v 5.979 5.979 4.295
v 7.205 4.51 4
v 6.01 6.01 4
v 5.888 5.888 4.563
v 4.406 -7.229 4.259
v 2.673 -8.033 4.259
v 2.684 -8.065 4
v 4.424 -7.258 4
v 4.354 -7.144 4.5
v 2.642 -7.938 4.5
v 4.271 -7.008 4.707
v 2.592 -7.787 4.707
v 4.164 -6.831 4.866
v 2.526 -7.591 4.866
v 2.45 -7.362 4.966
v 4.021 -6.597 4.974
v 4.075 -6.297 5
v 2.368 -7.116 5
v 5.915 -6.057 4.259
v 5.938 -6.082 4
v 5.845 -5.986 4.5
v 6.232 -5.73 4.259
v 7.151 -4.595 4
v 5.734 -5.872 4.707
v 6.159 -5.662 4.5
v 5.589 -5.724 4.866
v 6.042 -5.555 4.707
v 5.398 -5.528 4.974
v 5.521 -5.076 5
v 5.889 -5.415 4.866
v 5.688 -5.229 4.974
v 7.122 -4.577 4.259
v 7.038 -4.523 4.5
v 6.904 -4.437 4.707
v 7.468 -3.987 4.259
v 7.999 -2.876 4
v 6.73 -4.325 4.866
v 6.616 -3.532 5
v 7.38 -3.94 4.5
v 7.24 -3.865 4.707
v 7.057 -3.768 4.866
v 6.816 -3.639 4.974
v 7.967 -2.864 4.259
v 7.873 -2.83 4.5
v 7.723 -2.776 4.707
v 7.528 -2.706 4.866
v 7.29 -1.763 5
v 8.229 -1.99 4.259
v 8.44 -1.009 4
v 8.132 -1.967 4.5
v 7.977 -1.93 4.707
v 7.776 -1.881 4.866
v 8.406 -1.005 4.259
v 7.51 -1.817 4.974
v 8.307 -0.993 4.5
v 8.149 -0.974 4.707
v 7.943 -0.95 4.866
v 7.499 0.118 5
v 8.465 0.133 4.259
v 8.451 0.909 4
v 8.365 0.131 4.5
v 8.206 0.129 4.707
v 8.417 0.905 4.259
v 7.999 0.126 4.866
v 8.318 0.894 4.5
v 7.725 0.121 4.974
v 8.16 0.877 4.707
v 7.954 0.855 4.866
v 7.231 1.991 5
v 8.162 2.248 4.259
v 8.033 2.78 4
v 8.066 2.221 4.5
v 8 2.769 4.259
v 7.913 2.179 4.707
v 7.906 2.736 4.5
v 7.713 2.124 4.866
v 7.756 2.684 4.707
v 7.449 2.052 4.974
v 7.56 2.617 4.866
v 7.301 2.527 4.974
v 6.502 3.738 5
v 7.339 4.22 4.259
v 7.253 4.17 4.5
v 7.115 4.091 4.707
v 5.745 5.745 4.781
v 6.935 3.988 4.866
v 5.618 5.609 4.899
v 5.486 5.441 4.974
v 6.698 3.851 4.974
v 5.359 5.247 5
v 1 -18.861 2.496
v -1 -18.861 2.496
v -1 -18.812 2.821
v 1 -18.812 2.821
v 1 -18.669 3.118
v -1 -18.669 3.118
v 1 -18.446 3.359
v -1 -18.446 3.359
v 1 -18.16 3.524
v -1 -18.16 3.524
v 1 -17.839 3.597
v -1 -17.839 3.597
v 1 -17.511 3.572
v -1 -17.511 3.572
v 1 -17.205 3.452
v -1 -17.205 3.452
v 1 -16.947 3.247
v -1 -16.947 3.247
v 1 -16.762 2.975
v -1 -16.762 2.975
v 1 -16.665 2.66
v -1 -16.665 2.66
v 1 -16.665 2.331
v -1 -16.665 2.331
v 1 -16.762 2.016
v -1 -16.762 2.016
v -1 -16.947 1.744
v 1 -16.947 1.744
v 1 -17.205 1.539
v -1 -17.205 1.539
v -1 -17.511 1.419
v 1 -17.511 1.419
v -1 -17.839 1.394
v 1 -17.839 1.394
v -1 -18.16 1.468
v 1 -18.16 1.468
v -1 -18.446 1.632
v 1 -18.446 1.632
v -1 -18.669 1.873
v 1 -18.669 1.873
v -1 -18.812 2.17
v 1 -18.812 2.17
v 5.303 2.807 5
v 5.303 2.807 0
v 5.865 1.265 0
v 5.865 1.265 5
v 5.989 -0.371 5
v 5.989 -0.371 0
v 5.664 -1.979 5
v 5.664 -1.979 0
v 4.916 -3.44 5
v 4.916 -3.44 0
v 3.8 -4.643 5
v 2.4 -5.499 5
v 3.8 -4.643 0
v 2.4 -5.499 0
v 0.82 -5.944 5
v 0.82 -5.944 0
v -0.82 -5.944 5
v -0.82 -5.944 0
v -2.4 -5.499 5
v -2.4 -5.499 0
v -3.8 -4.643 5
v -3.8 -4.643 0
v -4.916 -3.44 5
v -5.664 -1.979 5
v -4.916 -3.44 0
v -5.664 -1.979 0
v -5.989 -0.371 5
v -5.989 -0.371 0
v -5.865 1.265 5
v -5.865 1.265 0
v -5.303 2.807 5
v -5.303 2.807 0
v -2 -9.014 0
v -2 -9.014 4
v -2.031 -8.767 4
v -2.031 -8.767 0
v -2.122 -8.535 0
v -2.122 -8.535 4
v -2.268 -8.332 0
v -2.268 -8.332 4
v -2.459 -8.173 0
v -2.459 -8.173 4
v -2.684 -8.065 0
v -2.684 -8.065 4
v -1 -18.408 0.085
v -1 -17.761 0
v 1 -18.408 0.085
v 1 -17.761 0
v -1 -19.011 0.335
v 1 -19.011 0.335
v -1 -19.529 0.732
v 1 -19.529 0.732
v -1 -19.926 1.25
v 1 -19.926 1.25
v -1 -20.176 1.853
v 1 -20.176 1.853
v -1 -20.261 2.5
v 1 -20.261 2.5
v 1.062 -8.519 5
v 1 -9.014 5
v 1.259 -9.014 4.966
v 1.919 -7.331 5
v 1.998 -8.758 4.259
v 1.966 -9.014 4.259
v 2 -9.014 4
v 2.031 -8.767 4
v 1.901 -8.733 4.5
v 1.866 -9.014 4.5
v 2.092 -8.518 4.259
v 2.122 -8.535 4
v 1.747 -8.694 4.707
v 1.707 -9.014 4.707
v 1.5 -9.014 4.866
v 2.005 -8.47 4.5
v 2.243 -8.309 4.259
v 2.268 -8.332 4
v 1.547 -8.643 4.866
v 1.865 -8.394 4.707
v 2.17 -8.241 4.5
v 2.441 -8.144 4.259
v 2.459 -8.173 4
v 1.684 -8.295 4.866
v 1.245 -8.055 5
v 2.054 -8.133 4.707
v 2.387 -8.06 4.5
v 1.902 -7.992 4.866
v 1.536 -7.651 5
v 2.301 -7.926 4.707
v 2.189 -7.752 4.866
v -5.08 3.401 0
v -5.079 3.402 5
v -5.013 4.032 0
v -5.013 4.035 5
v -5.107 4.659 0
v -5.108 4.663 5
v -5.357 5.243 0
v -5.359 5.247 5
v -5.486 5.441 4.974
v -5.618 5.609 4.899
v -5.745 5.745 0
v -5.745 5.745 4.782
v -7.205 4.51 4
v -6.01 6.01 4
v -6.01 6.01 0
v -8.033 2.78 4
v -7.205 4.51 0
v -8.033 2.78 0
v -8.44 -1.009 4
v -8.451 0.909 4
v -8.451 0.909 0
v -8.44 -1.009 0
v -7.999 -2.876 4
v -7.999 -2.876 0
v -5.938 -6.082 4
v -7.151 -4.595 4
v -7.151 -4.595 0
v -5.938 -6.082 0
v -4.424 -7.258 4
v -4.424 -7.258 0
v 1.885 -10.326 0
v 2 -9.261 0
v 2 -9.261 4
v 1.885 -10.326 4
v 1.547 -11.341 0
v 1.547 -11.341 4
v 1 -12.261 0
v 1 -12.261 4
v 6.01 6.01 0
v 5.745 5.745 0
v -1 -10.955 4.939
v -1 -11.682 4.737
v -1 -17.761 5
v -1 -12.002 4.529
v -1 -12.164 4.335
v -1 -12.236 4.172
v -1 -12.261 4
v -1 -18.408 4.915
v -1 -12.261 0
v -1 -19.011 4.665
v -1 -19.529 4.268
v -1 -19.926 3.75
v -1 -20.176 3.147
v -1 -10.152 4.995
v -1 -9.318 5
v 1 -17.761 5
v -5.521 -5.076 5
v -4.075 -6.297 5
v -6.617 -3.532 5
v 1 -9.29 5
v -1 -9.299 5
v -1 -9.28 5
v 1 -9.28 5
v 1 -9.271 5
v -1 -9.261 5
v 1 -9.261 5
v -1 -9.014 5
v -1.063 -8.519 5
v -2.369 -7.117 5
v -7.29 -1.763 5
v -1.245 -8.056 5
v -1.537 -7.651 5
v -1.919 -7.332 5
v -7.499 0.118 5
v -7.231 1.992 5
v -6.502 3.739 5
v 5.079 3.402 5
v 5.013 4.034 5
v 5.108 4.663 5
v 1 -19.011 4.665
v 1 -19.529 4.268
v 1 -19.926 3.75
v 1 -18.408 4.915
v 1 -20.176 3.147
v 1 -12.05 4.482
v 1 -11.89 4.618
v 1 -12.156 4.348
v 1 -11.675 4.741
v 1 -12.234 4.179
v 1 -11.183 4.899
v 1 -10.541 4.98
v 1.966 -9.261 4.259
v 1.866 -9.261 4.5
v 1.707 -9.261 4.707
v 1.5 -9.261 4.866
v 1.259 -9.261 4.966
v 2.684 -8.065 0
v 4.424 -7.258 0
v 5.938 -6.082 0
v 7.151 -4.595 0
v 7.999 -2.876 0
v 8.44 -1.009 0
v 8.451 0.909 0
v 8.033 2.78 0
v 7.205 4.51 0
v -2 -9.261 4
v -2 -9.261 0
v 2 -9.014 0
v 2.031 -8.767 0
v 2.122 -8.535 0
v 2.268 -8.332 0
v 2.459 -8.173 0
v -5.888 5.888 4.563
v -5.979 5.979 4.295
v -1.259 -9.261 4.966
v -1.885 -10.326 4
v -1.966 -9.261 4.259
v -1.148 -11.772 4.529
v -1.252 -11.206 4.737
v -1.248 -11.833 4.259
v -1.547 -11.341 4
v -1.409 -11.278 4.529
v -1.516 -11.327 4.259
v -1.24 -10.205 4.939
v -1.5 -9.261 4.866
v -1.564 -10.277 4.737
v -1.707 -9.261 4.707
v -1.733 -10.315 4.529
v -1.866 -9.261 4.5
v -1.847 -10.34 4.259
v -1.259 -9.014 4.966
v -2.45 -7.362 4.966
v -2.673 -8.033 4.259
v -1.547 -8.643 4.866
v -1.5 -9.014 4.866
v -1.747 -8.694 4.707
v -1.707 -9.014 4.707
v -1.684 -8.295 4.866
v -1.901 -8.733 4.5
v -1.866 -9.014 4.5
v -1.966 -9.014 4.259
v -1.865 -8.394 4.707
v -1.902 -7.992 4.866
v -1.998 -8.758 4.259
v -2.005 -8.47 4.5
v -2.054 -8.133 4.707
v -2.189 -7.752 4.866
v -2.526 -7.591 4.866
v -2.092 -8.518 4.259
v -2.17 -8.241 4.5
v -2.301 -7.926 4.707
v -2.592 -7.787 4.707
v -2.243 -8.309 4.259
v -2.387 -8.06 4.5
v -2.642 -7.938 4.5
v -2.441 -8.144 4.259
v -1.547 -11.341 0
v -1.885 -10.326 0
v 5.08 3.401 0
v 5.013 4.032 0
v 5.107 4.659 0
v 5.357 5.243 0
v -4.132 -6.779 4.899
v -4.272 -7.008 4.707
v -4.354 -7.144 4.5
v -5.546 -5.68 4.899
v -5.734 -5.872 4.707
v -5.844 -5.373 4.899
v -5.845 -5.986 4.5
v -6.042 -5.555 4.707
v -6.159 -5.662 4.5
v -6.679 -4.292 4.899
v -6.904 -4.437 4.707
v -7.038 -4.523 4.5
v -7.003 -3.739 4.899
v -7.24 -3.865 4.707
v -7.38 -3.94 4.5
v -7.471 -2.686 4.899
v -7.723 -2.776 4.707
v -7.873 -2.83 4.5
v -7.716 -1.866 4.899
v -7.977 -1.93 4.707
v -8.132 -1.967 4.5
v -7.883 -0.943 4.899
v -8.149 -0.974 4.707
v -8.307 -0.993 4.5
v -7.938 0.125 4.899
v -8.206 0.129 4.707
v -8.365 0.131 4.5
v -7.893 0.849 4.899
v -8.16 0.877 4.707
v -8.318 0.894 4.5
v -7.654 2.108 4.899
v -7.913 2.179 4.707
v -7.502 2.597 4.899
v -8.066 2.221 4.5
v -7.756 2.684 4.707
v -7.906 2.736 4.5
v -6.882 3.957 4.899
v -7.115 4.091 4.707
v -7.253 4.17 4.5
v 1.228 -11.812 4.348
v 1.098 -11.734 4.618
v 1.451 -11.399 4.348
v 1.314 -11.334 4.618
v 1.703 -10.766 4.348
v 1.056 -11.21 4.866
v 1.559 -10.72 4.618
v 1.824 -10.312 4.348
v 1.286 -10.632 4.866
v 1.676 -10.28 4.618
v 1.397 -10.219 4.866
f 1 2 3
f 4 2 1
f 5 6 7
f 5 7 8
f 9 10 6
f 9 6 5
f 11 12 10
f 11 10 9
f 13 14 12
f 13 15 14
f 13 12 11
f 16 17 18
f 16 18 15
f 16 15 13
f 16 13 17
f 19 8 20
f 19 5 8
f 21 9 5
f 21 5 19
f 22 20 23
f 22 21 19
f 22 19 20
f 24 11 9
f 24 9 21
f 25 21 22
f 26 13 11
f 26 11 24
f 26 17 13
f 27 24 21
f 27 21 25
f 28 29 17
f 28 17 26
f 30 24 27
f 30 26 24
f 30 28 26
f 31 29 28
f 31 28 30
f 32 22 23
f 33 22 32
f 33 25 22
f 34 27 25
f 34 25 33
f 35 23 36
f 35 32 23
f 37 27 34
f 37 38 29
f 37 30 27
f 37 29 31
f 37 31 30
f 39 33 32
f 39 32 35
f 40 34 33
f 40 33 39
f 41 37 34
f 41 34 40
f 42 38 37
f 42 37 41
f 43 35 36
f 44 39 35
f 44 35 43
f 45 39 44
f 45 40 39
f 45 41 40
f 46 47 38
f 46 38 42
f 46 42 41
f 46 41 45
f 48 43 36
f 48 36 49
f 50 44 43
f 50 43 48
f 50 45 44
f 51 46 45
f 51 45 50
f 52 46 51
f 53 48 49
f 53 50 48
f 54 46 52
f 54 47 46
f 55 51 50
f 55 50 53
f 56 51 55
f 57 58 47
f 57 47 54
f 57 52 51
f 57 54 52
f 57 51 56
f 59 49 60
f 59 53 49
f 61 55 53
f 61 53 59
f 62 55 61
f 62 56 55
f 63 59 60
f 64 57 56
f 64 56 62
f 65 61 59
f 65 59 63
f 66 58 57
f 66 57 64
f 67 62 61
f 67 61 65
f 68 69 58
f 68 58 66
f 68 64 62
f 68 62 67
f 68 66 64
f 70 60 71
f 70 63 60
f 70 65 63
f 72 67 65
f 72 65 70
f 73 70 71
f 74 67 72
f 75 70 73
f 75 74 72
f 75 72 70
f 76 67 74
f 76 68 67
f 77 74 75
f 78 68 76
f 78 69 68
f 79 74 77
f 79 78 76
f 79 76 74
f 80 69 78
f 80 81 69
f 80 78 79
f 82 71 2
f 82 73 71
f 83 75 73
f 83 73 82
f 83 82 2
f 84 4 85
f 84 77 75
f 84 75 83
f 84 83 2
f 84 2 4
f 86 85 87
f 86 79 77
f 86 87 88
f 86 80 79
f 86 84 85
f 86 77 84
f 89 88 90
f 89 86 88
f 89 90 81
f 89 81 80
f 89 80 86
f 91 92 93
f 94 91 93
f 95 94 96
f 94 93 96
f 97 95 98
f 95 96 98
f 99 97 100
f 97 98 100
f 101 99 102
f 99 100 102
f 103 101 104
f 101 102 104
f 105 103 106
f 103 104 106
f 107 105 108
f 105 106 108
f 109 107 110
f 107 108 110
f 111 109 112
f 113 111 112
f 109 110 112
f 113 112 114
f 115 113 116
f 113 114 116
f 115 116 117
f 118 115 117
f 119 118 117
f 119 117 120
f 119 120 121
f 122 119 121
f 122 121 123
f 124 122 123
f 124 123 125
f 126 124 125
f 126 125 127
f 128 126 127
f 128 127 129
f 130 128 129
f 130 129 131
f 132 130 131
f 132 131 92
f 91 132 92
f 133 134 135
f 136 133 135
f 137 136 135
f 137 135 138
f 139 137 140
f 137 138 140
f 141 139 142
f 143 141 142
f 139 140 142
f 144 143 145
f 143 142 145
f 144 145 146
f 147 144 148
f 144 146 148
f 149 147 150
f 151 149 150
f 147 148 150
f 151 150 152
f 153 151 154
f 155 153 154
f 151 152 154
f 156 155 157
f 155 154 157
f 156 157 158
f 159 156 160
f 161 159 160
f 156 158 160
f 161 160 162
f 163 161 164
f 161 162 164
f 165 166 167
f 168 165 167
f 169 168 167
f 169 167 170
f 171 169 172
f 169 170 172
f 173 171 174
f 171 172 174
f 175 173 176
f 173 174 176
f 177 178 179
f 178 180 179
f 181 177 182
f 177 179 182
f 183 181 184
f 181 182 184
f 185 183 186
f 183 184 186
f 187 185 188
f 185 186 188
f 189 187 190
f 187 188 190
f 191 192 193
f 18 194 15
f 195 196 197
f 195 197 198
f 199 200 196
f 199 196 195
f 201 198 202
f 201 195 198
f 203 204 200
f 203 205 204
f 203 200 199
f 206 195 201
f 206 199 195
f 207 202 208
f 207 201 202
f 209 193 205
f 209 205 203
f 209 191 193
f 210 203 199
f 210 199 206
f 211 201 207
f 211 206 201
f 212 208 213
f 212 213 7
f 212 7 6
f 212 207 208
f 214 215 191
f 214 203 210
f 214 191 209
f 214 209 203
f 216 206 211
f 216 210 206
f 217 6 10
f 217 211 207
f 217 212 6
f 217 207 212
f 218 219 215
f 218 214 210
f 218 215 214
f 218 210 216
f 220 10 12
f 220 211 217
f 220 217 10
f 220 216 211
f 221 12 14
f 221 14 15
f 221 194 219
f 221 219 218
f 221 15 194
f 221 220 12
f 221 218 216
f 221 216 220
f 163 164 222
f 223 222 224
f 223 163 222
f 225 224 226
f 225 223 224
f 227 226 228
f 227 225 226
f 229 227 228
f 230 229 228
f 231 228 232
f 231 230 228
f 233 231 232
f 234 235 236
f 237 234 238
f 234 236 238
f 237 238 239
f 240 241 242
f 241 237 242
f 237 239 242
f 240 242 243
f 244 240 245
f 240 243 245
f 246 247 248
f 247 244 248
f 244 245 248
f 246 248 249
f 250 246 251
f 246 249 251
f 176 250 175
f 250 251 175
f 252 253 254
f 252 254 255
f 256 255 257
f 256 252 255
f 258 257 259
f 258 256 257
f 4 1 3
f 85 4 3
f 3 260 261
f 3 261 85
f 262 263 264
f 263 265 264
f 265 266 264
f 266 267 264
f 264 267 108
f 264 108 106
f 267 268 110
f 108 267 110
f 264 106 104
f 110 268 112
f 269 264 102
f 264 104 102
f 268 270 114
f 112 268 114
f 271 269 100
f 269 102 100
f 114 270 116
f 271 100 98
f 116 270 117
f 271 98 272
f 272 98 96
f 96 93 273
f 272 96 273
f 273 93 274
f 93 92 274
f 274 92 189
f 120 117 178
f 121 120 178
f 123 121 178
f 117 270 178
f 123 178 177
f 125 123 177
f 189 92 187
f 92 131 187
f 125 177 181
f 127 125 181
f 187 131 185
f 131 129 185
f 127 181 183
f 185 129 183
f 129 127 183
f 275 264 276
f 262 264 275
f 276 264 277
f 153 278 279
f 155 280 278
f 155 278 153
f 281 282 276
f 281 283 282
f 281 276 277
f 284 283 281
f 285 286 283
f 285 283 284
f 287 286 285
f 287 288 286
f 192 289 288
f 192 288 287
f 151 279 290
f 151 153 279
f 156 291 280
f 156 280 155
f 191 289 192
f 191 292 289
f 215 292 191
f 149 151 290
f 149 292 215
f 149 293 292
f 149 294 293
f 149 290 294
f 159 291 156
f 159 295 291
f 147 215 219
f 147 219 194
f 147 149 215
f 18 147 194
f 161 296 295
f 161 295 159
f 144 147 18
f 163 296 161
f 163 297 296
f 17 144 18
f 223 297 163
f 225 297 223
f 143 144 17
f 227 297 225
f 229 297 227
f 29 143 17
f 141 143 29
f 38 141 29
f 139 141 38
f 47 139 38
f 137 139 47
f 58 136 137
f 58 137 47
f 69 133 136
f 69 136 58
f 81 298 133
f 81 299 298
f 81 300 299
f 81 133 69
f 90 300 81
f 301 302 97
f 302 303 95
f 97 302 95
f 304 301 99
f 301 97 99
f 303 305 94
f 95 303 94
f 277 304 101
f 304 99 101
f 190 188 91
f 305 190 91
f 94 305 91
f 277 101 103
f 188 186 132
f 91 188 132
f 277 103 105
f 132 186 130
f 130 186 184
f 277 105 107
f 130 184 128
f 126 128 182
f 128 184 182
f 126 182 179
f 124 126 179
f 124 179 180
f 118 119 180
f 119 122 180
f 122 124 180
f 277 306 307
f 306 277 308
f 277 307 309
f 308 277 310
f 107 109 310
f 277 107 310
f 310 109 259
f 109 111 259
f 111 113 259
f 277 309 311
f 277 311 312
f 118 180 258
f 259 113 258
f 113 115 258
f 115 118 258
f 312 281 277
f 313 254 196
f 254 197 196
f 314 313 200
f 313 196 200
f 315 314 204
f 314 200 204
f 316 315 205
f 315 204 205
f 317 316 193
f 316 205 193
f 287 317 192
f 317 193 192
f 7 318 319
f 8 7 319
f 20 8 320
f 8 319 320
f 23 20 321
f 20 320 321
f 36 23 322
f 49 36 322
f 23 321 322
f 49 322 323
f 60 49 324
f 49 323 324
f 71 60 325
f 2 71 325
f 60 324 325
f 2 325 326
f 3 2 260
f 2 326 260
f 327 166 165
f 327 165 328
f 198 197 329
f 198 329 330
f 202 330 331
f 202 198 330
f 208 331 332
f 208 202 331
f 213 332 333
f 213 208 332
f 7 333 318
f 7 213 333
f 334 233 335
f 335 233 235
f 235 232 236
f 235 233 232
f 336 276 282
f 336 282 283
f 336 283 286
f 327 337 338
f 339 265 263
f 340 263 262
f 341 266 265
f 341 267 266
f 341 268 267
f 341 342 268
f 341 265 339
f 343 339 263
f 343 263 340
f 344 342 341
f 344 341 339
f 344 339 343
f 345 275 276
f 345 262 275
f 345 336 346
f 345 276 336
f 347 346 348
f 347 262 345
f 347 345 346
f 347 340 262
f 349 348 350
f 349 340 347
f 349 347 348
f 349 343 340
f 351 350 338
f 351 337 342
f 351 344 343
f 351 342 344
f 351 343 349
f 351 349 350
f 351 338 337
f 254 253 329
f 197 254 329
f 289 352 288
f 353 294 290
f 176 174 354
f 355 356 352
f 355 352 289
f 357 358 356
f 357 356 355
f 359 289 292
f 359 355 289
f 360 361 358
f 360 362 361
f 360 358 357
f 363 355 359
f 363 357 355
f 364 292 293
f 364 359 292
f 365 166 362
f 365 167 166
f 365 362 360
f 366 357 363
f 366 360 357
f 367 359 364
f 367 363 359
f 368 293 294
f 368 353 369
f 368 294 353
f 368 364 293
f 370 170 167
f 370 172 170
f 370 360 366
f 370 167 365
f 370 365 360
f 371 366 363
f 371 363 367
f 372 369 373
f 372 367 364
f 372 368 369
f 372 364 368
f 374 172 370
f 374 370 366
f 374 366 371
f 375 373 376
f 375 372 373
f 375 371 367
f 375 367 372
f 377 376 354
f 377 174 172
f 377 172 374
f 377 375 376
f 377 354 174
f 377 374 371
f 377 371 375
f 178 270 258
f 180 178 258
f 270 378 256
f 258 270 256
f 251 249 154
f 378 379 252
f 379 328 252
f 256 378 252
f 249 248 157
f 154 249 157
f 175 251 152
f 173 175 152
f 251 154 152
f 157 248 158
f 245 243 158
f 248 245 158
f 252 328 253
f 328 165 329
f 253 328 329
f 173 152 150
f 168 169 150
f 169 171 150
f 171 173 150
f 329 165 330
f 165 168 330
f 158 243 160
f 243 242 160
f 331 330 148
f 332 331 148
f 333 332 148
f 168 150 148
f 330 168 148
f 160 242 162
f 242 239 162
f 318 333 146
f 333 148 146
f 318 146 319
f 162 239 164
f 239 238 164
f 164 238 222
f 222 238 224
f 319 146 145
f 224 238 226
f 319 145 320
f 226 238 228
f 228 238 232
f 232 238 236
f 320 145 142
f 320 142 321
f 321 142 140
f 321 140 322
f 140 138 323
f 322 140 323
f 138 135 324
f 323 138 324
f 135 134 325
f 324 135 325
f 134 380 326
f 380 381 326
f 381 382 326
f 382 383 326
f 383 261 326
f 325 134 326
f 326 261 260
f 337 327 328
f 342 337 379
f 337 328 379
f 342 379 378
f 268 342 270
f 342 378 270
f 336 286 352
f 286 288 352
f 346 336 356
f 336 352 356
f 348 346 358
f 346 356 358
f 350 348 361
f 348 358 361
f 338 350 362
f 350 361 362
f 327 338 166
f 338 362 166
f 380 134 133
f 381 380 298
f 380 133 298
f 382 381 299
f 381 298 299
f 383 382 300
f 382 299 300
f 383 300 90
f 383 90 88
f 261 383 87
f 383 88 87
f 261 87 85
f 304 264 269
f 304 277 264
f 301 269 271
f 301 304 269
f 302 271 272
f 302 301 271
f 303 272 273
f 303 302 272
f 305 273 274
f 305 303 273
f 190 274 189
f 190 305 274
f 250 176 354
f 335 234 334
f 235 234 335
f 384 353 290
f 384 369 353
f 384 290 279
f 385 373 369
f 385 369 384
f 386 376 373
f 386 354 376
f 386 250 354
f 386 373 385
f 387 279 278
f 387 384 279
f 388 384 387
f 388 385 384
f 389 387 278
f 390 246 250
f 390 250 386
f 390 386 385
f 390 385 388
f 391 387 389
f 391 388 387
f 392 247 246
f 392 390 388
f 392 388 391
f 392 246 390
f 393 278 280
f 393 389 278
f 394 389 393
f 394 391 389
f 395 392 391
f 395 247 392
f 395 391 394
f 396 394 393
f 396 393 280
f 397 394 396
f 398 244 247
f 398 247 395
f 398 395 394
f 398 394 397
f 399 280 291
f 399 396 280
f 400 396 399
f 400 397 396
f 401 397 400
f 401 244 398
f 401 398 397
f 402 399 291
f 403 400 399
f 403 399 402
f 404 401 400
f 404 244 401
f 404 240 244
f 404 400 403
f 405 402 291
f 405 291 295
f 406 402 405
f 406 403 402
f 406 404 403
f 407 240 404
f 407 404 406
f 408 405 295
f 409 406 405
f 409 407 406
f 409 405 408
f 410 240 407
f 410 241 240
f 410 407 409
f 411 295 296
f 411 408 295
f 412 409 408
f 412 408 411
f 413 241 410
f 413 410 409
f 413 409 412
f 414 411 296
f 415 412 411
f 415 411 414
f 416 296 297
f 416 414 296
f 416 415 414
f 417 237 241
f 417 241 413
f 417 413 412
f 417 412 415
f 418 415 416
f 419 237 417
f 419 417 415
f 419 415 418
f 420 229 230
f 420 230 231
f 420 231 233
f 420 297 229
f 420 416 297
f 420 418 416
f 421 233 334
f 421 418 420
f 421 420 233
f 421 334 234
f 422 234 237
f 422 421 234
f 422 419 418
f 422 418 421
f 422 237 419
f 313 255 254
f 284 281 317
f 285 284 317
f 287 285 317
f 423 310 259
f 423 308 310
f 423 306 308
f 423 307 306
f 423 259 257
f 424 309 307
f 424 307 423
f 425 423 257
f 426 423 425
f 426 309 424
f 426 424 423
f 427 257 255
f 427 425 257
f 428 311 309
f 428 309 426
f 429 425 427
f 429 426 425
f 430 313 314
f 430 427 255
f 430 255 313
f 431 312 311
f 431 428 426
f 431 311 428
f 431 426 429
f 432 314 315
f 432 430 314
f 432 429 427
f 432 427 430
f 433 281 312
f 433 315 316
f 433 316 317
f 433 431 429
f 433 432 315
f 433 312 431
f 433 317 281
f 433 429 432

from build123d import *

# Parameters (mm, degrees)
F1_DEPTH    = 5
F2_R        = 1.1043953889
F3_DEPTH    = 5
F4_R        = 2.5
F5_T1_DEPTH = 20
F6_F1_R     = 1
F6_F2_R     = 1
F6_F3_R     = 0.9999
F6_F4_R     = 0.9996
F7_R        = 2.49999


# Not quite as in the source:
# - a fillet or chamfer that OpenCascade refuses, or shapes differently, is made with other operations: its cross-section is extruded or revolved along the edge and cut away or added
# - a fillet or chamfer is up to 0.001 mm smaller than in the source, because OpenCascade refuses the exact size


with BuildPart() as f1:
    # F0 (on Top) → F1 (new body)
    with BuildSketch(Plane.XY):
        with BuildLine():
            ThreePointArc((4.2426406871, 4.2426406871), (0, -6), (-4.2426406871, 4.2426406871))
            Line((-4.2426406871, 4.2426406871), (-6.0104076401, 6.0104076401))
            ThreePointArc((-6.0104076401, 6.0104076401), (-8.1830596791, -2.2994639132), (-2, -8.2613558209))
            Line((-2, -8.2613558209), (-2, -12.2613558209))
            Line((-2, -12.2613558209), (-1, -12.2613558209))
            Line((-1, -12.2613558209), (-1, -20.2613558209))
            Line((-1, -20.2613558209), (0, -20.2613558209))
            Line((0, -20.2613558209), (1, -20.2613558209))
            Line((1, -20.2613558209), (1, -12.2613558209))
            Line((1, -12.2613558209), (2, -12.2613558209))
            Line((2, -12.2613558209), (2, -8.2613558209))
            ThreePointArc((2, -8.2613558209), (8.1830596791, -2.2994639132), (6.0104076401, 6.0104076401))
            Line((6.0104076401, 6.0104076401), (4.2426406871, 4.2426406871))
        make_face()
    extrude(amount=F1_DEPTH)

    # F2 (on face) → F3 (cut)
    with BuildSketch(Plane(origin=(-1, 0, 0), x_dir=(0, -1, 0), z_dir=(-1, 0, 0))):
        with Locations((17.756960432, 2.4956046111)):
            Circle(F2_R)
    extrude(amount=-F3_DEPTH, mode=Mode.SUBTRACT)

    # F4
    f4_edges = [f1.edges().sort_by_distance(p)[0] for p in [
        (4.242641, 4.242641, 2.5),
        (-4.242641, 4.242641, 2.5),
    ]]
    fillet(f4_edges, radius=F4_R)

    # F5: fillet of radius 5 on 2 edges, made by hand

    # F5_s2 → F5_t1 (cut)
    with BuildSketch(Plane.XY.offset(-7.5)):
        with BuildLine():
            ThreePointArc((2, -9.2613558209), (1.7434164903, -10.842494651), (1, -12.2613558209))
            Line((1, -12.2613558209), (2, -12.2613558209))
            Line((2, -12.2613558209), (2, -9.2613558209))
        make_face()
        with BuildLine():
            ThreePointArc((-2, -9.2613558209), (-1.7434164903, -10.842494651), (-1, -12.2613558209))
            Line((-1, -12.2613558209), (-2, -12.2613558209))
            Line((-2, -12.2613558209), (-2, -9.2613558209))
        make_face()
    extrude(amount=F5_T1_DEPTH, mode=Mode.SUBTRACT)

    # F6: fillet of radius 1 on 6 edges, made by hand

    # F6_f1
    f6_f1_edges = [f1.edges().sort_by_distance(p)[0] for p in [
        (-2, -8.2613558209, 2.5),
    ]]
    fillet(f6_f1_edges, radius=F6_F1_R)

    # F6_f2
    f6_f2_edges = [f1.edges().sort_by_distance(p)[0] for p in [
        (2, -8.2613558209, 2.5),
    ]]
    fillet(f6_f2_edges, radius=F6_F2_R)

    # F6_f3 (radius 1 in the source; OpenCascade refuses exactly that, so slightly less here)
    f6_f3_edges = [f1.edges().sort_by_distance(p)[0] for p in [
        (2, -9.1376170048, 5),
        (1.7434164903, -10.842494651, 5),
    ]]
    fillet(f6_f3_edges, radius=F6_F3_R)

    # F6_f4 (radius 1 in the source; OpenCascade refuses exactly that, so slightly less here)
    f6_f4_edges = [f1.edges().sort_by_distance(p)[0] for p in [
        (-1.7434164903, -10.842494651, 5),
        (-2, -9.1376170048, 5),
    ]]
    fillet(f6_f4_edges, radius=F6_F4_R)

    # F7 (radius 2.5 in the source; OpenCascade refuses exactly that, so slightly less here)
    f7_edges = [f1.edges().sort_by_distance(p)[0] for p in [
        (0, -20.261356, 5),
        (0, -20.261356, 0),
    ]]
    fillet(f7_edges, radius=F7_R)


solid = f1.part
